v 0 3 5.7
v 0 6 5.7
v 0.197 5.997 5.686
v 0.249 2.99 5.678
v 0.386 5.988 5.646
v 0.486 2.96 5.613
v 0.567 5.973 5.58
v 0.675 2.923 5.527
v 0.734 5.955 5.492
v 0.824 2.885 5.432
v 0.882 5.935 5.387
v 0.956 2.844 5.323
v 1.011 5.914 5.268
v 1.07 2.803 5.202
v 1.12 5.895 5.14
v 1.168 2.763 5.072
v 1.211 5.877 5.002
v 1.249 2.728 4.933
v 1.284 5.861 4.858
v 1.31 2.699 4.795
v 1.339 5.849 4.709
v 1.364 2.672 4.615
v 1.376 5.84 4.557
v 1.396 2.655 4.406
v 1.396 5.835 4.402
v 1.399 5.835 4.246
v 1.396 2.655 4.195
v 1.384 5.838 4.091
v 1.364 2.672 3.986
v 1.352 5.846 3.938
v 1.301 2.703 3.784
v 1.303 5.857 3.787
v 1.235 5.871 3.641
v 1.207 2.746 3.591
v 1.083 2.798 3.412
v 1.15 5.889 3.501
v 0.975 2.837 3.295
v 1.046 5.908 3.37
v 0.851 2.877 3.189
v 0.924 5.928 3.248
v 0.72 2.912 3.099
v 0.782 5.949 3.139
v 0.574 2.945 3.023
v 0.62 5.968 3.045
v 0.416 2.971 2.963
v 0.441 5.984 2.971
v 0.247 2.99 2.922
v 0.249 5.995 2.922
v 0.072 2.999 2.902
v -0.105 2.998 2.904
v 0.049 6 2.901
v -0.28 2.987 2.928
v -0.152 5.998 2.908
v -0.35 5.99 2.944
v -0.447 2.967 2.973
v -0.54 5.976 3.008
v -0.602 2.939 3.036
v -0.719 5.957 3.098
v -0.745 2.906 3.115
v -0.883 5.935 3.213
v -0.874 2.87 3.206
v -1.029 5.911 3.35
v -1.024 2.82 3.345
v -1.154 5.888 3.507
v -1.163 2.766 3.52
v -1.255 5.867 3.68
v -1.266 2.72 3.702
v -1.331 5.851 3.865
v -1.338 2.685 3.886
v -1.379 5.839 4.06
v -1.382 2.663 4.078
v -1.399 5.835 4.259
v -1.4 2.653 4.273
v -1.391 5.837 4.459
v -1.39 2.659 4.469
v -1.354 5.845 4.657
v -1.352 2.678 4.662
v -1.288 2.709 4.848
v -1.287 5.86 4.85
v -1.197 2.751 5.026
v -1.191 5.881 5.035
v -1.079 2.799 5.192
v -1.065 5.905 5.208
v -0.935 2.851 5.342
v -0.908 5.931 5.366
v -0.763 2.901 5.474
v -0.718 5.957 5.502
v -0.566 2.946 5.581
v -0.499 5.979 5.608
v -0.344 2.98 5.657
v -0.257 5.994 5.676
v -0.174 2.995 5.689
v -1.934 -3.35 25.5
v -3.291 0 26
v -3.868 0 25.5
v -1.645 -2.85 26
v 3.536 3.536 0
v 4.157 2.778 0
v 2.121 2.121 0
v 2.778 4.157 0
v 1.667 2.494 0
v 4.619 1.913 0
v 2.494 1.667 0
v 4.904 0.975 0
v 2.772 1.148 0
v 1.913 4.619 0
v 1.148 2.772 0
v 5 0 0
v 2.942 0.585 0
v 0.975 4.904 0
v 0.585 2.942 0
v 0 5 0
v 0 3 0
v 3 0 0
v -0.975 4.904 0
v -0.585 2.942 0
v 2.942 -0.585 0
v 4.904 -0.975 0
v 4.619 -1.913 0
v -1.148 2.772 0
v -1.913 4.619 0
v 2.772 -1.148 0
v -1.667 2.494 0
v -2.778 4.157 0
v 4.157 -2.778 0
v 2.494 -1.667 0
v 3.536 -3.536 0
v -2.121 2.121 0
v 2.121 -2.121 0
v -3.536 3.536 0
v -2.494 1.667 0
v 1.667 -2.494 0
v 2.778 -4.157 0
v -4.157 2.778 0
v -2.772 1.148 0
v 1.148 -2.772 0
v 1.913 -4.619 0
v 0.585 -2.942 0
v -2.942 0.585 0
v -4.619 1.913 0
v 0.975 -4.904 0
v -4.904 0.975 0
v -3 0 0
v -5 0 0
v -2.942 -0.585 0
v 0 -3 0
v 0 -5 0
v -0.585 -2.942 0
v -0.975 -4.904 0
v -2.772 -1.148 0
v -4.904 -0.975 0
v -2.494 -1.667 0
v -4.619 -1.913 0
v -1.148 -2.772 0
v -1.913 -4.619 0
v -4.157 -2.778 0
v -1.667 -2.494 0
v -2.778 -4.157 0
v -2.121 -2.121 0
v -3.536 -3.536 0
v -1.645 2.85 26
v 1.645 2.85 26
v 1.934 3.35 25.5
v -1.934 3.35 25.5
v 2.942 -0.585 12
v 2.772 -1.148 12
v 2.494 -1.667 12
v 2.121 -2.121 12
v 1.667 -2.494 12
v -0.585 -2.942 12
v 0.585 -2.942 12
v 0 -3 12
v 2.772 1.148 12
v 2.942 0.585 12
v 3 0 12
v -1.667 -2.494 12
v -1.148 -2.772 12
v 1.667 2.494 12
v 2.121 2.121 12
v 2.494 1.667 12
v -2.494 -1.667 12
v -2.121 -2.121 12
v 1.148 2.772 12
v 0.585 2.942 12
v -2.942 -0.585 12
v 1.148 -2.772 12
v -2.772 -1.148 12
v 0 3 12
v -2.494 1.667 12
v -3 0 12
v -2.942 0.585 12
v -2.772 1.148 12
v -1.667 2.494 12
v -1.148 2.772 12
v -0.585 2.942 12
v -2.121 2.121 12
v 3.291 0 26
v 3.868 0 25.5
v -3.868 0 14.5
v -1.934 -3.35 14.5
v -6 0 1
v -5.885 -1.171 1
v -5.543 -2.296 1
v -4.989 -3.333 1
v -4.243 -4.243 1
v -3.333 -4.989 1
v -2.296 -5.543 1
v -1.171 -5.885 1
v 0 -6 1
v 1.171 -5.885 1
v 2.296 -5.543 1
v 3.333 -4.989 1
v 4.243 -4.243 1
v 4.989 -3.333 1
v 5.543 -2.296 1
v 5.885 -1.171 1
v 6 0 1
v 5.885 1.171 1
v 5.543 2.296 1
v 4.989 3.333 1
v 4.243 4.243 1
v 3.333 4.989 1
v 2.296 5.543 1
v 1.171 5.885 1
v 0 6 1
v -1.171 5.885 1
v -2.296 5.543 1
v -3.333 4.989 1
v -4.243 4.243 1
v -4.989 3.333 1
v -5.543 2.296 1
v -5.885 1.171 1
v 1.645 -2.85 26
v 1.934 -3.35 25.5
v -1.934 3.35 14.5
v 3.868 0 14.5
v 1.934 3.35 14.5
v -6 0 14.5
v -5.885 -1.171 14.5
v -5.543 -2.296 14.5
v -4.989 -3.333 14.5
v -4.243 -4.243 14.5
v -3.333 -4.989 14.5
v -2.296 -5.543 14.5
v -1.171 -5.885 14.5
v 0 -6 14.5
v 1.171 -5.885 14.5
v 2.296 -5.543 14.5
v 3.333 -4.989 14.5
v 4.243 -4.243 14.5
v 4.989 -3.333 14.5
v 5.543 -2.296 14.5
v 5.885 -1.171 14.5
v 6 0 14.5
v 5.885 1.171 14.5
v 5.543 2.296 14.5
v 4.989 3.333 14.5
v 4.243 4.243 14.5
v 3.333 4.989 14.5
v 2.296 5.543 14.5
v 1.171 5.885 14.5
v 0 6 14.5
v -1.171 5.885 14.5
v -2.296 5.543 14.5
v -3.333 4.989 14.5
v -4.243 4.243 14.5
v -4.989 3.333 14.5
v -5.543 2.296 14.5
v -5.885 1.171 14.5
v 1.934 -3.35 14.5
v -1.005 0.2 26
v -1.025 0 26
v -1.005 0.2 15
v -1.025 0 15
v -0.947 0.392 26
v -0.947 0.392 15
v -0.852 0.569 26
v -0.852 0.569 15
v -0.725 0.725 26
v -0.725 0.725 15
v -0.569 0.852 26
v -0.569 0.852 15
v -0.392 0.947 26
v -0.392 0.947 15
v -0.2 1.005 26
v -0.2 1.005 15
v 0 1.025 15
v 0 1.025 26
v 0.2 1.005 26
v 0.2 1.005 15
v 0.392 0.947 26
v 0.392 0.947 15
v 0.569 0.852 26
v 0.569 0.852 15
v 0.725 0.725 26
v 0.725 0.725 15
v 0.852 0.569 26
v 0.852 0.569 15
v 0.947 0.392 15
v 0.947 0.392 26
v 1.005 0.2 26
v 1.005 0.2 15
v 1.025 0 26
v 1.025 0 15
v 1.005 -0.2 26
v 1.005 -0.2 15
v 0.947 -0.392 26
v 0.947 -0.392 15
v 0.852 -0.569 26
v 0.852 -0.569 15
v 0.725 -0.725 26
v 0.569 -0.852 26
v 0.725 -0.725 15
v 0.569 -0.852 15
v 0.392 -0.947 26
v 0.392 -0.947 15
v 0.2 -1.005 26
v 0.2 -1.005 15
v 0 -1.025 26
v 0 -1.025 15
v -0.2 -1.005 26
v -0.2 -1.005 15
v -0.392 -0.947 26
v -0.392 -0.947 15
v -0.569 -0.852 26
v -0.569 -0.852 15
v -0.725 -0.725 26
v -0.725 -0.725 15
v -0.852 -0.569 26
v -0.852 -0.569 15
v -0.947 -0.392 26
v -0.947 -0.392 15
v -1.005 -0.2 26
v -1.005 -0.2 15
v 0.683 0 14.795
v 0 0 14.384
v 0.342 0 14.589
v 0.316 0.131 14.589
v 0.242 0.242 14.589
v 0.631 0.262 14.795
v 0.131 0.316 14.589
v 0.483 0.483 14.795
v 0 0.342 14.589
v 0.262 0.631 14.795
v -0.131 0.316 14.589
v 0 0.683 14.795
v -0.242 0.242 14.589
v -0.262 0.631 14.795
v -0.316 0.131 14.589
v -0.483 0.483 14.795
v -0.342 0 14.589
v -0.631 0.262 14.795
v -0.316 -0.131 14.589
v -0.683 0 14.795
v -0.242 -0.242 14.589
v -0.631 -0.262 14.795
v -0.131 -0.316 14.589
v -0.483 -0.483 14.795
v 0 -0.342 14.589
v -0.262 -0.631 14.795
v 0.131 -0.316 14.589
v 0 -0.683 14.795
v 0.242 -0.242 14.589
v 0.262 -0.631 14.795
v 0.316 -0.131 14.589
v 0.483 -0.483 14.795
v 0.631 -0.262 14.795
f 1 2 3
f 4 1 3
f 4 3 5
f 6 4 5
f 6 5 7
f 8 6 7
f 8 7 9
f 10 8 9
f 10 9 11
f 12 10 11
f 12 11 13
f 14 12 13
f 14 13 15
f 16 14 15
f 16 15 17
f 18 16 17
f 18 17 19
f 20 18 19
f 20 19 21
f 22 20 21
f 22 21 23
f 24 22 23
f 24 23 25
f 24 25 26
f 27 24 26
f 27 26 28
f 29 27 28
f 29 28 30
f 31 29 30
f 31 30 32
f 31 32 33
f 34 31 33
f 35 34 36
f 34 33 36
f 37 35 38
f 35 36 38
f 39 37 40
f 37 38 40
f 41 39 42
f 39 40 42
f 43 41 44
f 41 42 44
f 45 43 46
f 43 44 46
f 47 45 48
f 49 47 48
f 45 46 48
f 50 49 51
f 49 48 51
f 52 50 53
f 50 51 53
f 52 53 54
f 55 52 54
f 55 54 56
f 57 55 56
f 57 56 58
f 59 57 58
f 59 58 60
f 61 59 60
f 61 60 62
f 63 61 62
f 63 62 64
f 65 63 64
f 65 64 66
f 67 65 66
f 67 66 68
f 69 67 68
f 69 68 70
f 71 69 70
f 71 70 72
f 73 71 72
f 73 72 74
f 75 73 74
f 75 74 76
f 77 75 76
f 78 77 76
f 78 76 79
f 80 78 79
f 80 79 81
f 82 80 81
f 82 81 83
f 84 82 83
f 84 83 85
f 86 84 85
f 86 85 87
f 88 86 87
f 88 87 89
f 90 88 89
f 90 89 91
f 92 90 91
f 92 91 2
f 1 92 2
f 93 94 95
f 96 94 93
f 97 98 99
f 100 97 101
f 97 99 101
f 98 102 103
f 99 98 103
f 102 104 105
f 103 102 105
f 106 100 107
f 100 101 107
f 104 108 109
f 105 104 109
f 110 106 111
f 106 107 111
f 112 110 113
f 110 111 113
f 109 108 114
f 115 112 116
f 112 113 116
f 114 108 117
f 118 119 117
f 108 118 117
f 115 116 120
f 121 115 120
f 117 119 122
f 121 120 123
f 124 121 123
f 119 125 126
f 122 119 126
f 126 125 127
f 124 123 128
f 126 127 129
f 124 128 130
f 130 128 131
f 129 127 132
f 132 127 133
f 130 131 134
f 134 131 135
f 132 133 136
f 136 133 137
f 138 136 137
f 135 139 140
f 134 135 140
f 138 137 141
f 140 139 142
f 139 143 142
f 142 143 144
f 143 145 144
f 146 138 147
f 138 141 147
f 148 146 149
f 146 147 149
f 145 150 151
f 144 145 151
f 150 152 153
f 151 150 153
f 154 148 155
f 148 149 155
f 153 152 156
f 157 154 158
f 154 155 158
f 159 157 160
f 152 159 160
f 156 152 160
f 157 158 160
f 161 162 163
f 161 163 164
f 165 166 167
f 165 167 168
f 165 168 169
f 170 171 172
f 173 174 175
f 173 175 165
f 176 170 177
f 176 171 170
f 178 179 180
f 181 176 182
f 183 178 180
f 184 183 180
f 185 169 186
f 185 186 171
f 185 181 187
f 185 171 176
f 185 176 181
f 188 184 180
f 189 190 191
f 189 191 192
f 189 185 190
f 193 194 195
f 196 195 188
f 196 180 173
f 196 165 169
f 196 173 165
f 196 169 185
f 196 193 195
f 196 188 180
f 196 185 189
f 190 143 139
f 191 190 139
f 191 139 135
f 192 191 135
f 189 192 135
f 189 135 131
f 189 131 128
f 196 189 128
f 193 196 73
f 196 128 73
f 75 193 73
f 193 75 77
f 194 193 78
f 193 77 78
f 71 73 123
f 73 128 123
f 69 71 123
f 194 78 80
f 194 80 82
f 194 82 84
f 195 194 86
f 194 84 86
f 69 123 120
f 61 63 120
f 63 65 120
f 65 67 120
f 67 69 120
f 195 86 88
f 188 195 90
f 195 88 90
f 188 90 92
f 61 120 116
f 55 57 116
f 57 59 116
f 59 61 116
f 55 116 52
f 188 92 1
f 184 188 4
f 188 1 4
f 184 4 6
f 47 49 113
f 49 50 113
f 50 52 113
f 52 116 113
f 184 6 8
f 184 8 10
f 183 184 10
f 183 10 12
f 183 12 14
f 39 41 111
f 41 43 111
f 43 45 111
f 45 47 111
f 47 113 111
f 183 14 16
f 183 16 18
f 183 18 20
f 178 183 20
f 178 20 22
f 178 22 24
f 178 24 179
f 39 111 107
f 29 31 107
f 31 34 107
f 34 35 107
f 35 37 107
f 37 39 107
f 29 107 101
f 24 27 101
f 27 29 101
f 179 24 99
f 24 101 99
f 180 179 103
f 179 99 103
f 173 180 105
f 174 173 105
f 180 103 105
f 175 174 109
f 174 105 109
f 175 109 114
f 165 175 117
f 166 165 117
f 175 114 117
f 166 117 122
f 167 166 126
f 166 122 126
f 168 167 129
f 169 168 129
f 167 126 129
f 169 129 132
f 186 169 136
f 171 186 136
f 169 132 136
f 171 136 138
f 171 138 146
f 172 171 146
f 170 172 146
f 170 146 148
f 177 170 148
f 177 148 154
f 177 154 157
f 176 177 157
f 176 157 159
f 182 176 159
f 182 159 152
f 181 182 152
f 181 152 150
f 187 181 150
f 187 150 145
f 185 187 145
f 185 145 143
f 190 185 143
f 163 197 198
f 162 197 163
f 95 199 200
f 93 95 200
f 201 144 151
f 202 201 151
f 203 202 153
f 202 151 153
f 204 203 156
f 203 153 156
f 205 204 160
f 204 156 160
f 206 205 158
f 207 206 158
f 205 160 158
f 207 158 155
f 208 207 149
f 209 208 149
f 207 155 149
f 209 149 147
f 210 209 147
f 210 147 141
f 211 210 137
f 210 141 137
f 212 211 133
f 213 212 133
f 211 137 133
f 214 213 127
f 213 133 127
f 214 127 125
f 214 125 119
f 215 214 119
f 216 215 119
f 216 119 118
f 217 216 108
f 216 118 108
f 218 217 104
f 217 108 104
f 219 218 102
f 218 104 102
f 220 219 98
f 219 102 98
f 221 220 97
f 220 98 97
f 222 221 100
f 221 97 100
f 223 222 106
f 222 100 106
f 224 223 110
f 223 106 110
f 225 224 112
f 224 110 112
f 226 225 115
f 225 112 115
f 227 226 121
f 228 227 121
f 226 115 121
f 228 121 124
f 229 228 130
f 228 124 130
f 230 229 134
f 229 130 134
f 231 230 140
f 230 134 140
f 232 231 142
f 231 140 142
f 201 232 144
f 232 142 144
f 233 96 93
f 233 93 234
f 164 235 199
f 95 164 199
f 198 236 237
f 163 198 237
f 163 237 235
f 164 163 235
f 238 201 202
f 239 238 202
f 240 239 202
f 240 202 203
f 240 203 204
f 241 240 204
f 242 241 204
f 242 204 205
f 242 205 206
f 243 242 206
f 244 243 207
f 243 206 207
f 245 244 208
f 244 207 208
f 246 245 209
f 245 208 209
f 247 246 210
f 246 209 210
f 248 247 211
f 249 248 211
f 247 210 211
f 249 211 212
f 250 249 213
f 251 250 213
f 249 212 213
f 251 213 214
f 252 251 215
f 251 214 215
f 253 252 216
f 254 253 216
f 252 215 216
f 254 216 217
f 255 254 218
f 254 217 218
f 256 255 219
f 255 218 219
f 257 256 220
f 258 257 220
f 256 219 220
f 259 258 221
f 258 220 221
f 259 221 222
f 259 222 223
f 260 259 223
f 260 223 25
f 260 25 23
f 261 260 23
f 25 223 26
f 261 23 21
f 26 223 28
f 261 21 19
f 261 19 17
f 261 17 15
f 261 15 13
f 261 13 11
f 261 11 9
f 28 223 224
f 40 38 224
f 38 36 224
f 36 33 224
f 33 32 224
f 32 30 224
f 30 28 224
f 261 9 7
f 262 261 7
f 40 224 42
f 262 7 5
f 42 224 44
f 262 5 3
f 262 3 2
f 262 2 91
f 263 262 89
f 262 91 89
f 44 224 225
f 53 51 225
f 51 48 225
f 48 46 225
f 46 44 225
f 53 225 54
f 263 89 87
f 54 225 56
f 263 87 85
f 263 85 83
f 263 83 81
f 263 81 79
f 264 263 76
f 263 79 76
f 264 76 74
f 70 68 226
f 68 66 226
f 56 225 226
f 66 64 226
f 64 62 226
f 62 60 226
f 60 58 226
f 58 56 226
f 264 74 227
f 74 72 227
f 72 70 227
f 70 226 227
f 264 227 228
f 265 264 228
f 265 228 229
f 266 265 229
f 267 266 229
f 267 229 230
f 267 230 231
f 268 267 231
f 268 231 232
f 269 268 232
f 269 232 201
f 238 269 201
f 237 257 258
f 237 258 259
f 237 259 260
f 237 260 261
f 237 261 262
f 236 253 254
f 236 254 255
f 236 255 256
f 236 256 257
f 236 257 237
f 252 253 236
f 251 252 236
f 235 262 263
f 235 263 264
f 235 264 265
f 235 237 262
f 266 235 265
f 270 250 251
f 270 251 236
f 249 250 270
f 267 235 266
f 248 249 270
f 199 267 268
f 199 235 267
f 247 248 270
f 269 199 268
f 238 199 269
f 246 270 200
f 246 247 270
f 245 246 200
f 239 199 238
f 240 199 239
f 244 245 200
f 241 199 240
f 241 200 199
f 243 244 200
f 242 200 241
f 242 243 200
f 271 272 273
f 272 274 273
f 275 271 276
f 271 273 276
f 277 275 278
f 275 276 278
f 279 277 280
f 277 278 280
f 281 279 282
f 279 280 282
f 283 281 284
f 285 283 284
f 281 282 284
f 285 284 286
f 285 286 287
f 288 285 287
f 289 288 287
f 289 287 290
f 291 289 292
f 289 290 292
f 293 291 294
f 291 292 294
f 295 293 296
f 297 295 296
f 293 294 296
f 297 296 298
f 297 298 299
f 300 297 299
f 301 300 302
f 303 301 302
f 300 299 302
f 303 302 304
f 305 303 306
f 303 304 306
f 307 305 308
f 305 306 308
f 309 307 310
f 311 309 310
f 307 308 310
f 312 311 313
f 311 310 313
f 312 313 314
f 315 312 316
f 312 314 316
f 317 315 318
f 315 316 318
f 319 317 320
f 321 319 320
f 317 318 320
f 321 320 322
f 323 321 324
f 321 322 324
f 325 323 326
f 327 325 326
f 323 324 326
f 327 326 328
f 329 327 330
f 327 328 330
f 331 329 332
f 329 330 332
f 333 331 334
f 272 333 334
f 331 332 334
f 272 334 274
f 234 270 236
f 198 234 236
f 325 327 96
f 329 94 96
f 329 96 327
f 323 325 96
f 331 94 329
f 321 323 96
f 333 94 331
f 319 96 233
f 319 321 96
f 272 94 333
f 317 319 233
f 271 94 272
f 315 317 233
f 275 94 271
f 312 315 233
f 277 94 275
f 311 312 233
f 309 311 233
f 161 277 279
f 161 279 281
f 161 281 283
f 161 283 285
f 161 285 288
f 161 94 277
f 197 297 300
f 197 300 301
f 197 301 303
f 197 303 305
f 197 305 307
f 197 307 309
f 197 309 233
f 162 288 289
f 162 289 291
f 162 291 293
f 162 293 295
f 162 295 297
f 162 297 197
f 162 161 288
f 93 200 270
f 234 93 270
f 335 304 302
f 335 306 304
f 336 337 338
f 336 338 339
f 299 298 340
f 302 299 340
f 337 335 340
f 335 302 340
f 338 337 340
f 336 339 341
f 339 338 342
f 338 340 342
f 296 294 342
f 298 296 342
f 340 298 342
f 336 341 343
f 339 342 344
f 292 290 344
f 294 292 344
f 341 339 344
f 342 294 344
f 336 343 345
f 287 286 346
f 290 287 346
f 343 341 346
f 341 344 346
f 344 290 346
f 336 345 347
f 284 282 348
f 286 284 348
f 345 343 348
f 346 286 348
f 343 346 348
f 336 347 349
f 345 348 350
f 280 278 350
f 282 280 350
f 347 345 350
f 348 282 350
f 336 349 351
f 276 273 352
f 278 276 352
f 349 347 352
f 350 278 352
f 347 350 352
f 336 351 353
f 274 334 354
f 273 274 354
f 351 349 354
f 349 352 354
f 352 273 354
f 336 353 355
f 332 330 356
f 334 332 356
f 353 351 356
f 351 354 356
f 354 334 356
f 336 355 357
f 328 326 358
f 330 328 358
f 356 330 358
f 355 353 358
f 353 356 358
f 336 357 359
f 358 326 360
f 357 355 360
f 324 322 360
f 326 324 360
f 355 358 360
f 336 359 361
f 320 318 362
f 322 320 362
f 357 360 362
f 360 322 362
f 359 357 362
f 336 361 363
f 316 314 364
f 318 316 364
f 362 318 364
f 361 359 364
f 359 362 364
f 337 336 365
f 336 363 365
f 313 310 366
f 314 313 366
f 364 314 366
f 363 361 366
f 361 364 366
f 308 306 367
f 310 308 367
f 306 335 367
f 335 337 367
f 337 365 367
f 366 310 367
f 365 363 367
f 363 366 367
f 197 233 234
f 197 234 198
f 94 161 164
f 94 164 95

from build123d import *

# Parameters (mm, degrees)
SKETCH_1_R               = 6
EXTRUDE_1_DEPTH          = 14.5
EXTRUDE_2_DEPTH          = 11.5
HOLE_WIZARD_M2_5_1_D     = 2.05
HOLE_WIZARD_M2_5_1_DEPTH = 11
HOLE_WIZARD_M2_5_1_TIP   = 0.615882135
SKETCH_6_R               = 3
CUT_EXTRUDE_1_DEPTH      = 12
CHAMFER_2_SIZE           = 1
CHAMFER_3_SIZE           = 0.5
SKETCH_7_R               = 1.4
CUT_EXTRUDE_2_DEPTH      = 6


with BuildPart() as part:
    # 草图1 → 凸台-拉伸1 (new body)
    with BuildSketch(Plane.XY):
        with Locations(Location((0, 0, 0), (0, 0, 180))):
            Circle(SKETCH_1_R)
    extrude(amount=EXTRUDE_1_DEPTH)

    # 草图2 → 凸台-拉伸2 (add)
    with BuildSketch(Plane.XY.offset(14.5)):
        Polygon((3.868246804, 0), (1.934123402, 3.35), (-1.934123402, 3.35), (-3.868246804, 0), (-1.934123402, -3.35), (1.934123402, -3.35), align=None)
    extrude(amount=EXTRUDE_2_DEPTH)

    # M2.5 螺纹孔1
    with Locations(Plane.XY.offset(26)):
        with Locations((0, 0)):
            Hole(HOLE_WIZARD_M2_5_1_D / 2, depth=HOLE_WIZARD_M2_5_1_DEPTH)
            with Locations((0, 0, -(HOLE_WIZARD_M2_5_1_DEPTH + HOLE_WIZARD_M2_5_1_TIP / 2))):  # 118° drill point
                Cone(0, HOLE_WIZARD_M2_5_1_D / 2, HOLE_WIZARD_M2_5_1_TIP, mode=Mode.SUBTRACT)

    # 草图6 → 切除-拉伸1 (cut)
    with BuildSketch(Plane(origin=(0, 0, 0), x_dir=(-1, 0, 0), z_dir=(0, 0, -1))):
        Circle(SKETCH_6_R)
    extrude(amount=-CUT_EXTRUDE_1_DEPTH, mode=Mode.SUBTRACT)

    # 倒角2
    chamfer_2_edges = [part.edges().sort_by_distance(p)[0] for p in [
        (6, 0, 0),
    ]]
    chamfer(chamfer_2_edges, length=CHAMFER_2_SIZE)

    # 倒角3
    chamfer_3_edges = [part.edges().sort_by_distance(p)[0] for p in [
        (2.901185103, -1.675, 26),
        (2.901185103, 1.675, 26),
        (0, 3.35, 26),
        (-2.901185103, 1.675, 26),
        (-2.901185103, -1.675, 26),
        (0, -3.35, 26),
    ]]
    chamfer(chamfer_3_edges, length=CHAMFER_3_SIZE)

    # 草图7 → 切除-拉伸2 (cut)
    with BuildSketch(Plane(origin=(0, 6, 0), x_dir=(1, 0, 0), z_dir=(0, 1, 0))):
        with Locations(Location((0, -4.3, 0), (0, 0, 270))):
            Circle(SKETCH_7_R)
    extrude(amount=-CUT_EXTRUDE_2_DEPTH, mode=Mode.SUBTRACT)


solid = part.part
